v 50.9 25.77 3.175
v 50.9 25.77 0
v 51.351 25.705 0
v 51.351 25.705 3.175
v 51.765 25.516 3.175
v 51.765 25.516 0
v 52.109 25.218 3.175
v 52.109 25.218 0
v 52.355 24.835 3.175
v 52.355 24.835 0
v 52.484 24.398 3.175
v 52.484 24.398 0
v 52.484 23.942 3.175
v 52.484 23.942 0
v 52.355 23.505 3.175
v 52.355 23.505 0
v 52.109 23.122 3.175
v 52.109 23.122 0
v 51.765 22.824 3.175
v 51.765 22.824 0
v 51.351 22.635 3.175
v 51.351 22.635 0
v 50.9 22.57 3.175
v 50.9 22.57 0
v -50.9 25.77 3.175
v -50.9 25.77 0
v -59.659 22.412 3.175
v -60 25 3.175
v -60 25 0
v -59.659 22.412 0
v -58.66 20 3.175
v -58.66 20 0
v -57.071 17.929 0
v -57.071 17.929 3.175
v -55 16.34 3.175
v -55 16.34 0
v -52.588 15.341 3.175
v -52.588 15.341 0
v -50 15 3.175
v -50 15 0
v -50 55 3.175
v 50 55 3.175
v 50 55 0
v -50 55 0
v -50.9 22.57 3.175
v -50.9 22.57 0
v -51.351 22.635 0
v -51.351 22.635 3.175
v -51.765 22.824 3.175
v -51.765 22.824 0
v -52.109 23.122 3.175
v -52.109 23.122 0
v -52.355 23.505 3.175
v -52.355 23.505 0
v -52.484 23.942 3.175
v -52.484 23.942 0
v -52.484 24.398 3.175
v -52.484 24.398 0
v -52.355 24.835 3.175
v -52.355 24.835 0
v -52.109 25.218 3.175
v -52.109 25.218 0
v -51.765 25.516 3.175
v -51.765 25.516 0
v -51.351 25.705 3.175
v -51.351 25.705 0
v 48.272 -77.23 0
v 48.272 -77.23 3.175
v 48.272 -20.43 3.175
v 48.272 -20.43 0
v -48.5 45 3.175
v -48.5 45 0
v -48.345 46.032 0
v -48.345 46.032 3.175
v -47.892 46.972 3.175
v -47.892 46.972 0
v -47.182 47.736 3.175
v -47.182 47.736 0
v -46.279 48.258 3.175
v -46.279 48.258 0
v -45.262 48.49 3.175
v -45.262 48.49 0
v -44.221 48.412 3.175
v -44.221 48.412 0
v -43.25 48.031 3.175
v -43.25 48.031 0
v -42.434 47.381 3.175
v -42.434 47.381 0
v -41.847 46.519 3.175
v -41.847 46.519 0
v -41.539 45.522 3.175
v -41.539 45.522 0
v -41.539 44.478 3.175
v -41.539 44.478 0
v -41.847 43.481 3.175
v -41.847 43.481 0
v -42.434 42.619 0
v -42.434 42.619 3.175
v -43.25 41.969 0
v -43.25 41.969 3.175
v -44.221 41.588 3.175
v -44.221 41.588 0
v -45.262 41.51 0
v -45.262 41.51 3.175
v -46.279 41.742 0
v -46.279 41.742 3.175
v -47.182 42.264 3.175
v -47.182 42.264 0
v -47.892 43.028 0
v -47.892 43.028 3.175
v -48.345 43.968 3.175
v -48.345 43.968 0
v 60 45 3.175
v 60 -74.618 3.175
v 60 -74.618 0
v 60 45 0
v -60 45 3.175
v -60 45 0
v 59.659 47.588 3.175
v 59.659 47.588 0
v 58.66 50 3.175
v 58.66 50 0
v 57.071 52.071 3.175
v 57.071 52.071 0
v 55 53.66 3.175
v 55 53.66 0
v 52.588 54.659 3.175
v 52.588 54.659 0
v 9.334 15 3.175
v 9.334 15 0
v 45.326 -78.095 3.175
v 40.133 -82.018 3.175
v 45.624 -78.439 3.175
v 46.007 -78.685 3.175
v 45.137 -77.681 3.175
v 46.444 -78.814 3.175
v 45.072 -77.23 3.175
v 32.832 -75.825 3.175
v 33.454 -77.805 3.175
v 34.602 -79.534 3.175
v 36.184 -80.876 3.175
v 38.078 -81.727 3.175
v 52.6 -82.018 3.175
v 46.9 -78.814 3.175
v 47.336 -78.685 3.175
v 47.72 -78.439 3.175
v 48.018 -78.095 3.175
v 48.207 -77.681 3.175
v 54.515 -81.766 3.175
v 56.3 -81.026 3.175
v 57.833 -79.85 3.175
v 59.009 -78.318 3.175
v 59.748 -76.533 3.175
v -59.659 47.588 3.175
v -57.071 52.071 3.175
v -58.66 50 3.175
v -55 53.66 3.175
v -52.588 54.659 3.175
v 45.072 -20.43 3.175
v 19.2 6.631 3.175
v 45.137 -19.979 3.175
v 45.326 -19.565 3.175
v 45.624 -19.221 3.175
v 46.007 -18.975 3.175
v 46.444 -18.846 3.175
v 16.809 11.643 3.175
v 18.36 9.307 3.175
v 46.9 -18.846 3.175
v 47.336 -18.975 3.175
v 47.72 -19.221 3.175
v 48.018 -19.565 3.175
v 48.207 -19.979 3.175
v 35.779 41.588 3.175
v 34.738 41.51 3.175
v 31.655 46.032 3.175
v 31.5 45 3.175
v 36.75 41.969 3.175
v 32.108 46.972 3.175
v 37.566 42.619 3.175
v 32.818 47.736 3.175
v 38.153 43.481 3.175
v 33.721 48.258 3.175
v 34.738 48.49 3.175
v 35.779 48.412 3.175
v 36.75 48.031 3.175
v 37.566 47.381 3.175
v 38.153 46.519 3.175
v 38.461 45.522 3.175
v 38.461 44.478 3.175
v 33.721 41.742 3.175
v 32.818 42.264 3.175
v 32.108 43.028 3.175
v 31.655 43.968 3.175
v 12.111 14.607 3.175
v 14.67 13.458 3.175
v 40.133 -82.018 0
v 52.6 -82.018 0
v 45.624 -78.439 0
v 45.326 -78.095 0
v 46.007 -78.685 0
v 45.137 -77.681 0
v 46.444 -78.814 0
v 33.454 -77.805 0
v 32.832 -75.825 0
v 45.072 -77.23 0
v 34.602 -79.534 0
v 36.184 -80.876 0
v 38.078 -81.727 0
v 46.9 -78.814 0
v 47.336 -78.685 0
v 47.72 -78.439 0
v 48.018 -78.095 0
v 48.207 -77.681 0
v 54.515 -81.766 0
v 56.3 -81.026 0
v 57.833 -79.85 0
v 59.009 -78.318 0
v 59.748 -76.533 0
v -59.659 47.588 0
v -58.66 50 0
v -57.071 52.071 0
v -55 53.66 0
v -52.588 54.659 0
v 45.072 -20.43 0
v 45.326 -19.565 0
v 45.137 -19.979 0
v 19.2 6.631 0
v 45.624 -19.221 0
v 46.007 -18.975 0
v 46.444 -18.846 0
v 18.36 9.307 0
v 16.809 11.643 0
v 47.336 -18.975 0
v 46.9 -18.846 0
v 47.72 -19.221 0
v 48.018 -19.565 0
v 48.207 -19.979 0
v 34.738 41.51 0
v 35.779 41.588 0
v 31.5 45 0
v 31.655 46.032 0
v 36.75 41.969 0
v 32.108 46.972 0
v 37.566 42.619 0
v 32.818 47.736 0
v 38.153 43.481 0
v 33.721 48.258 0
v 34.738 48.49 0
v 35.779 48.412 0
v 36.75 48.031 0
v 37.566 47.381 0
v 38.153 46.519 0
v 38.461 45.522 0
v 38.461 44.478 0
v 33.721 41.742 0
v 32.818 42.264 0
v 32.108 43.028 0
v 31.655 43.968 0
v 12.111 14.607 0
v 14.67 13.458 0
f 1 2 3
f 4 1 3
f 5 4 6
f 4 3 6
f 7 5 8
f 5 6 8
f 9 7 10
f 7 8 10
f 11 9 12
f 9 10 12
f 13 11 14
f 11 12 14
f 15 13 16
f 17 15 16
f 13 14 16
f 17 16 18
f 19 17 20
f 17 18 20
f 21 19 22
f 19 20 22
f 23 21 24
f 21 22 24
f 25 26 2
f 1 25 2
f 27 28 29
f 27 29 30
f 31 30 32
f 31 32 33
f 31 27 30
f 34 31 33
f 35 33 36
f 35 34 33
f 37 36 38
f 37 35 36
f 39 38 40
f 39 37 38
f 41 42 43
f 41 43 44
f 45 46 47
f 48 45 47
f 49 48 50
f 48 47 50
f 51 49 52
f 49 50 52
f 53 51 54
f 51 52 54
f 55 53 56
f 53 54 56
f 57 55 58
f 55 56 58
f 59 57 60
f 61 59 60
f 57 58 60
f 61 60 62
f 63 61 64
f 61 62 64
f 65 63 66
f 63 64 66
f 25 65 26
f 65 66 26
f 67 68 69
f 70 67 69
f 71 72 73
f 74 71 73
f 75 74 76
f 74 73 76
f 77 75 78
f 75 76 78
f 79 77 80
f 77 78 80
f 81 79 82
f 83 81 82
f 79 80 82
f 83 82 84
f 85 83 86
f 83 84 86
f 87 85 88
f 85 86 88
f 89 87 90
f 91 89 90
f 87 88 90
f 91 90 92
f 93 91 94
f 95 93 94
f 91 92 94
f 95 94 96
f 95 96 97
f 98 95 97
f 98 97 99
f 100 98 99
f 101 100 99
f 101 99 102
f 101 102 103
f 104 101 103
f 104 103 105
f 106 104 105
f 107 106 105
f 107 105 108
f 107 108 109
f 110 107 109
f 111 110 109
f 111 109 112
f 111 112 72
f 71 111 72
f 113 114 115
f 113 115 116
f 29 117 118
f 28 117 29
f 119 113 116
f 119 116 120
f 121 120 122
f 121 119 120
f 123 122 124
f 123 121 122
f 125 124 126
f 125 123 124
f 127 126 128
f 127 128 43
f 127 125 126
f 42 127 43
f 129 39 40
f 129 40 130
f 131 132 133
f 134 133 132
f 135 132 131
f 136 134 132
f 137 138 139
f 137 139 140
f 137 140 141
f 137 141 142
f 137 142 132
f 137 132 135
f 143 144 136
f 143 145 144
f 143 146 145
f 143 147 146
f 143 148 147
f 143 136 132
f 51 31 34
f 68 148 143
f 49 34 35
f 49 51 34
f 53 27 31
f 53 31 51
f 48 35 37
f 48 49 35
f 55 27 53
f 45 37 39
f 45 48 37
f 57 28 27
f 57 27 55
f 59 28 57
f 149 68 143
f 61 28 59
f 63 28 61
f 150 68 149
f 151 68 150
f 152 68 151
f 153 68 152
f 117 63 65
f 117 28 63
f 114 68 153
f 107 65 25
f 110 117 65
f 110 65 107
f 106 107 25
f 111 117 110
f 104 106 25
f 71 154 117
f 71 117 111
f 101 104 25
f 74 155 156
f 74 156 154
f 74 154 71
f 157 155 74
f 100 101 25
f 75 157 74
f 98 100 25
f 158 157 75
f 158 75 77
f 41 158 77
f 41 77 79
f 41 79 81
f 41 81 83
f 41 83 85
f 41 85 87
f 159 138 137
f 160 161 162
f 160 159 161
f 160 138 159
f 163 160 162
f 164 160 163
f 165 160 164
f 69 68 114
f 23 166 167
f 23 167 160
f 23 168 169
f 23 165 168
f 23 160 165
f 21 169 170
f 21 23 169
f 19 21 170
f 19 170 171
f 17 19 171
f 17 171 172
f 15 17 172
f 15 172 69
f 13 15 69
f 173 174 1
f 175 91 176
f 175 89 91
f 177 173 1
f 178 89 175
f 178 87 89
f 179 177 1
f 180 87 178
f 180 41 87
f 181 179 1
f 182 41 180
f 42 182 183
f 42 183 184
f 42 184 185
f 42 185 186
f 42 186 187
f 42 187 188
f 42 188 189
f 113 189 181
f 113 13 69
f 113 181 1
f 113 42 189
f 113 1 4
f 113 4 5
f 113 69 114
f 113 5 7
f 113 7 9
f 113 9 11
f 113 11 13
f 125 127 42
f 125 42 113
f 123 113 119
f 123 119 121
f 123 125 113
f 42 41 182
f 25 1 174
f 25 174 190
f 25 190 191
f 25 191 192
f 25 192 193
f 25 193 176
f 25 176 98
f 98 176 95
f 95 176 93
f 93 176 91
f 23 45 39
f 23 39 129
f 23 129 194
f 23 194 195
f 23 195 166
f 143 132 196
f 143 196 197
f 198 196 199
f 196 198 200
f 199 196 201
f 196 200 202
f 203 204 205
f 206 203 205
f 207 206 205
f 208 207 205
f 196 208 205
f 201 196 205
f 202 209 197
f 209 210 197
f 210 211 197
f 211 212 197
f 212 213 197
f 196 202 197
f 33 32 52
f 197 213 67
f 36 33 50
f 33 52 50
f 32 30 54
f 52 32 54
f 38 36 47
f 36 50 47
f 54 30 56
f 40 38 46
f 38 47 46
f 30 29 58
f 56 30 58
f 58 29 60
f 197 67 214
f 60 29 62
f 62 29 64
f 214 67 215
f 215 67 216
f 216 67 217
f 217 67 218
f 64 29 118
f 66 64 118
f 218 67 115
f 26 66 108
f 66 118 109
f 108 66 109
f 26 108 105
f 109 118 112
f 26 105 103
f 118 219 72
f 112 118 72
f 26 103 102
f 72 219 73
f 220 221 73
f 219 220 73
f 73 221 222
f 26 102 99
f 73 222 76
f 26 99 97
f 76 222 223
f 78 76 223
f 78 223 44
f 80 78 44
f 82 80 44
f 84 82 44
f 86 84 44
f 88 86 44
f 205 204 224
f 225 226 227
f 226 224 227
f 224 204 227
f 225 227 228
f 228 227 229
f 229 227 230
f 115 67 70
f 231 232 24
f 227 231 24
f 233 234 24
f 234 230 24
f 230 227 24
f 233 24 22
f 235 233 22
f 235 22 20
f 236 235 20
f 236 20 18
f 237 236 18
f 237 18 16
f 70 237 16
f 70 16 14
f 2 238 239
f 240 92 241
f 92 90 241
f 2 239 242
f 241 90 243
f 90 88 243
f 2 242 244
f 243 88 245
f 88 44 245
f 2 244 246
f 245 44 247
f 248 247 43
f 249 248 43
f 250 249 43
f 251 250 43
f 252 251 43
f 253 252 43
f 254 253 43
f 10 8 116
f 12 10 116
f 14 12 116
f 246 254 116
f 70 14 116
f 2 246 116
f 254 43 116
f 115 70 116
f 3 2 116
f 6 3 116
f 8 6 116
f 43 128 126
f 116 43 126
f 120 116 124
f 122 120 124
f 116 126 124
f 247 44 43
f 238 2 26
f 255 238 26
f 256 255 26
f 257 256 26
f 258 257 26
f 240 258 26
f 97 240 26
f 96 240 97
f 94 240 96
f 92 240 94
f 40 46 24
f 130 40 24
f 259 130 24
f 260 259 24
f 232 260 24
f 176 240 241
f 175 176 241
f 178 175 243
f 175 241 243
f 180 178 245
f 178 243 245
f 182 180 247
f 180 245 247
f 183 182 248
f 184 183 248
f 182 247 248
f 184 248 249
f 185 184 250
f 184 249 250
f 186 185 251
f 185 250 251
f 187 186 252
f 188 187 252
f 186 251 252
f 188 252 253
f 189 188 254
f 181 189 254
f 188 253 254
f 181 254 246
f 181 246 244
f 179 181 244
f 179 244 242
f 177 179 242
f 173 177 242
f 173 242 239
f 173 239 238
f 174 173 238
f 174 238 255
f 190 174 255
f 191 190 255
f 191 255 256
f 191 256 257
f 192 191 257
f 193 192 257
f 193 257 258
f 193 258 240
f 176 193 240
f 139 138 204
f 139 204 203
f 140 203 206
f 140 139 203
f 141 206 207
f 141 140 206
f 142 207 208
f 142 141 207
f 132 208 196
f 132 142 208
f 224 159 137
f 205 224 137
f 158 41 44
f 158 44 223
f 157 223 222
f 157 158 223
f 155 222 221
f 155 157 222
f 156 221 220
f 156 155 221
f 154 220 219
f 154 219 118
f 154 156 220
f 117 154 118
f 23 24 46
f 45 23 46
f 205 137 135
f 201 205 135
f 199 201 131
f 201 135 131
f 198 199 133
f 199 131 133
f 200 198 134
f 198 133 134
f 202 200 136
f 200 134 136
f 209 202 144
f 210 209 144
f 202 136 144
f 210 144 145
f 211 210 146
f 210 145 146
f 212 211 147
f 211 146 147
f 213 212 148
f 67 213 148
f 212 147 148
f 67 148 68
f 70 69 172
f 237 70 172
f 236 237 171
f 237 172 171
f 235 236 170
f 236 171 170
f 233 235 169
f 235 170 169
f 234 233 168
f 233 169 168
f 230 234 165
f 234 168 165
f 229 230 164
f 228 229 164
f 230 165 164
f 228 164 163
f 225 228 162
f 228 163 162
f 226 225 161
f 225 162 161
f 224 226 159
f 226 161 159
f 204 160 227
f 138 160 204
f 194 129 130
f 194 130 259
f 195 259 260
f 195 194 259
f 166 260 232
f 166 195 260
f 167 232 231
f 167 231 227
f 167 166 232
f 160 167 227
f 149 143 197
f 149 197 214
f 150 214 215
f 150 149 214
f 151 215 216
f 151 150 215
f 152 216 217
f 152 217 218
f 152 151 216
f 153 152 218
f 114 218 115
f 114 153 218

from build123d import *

# Parameters (mm, degrees)
BASE_FLANGE1_DEPTH       = 3.175
CUT_EXTRUDE1_DEPTH       = 102.670918338
CUT_EXTRUDE2_DEPTH       = 102.670918338
F_7_0_7_DIAMETER_HOLE1_D = 7


# Sheet-metal steps are written as plain solids
with BuildPart() as part:
    # Sketch11 → Base-Flange1 (new body)
    with BuildSketch(Plane.XY.offset(3.175)):
        with BuildLine():
            Line((40.132559776, -82.017650604), (52.6, -82.017650604))
            ThreePointArc((52.6, -82.017650604), (57.832590181, -79.850240785), (60, -74.617650604))
            Line((60, -74.617650604), (60, 45))
            ThreePointArc((60, 45), (57.071067812, 52.071067812), (50, 55))
            Line((50, 55), (-50, 55))
            ThreePointArc((-50, 55), (-57.071067812, 52.071067812), (-60, 45))
            Line((-60, 45), (-60, 25))
            ThreePointArc((-60, 25), (-57.071067812, 17.928932188), (-50, 15))
            Line((-50, 15), (9.334375382, 15))
            ThreePointArc((9.334375382, 15), (15.803139956, 12.62594813), (19.200468004, 6.631016977))
            Line((19.200468004, 6.631016977), (32.831651236, -75.824603167))
            ThreePointArc((32.831651236, -75.824603167), (35.345673992, -80.260852221), (40.132559776, -82.017650604))
        make_face()
    extrude(amount=-BASE_FLANGE1_DEPTH)

    # Sketch16 → Cut-Extrude1 (cut, through all)
    with BuildSketch(Plane.XY.offset(3.175)):
        with BuildLine():
            Line((45.071829224, -20.429999447), (45.071829224, -77.229999447))
            ThreePointArc((45.071829224, -77.229999447), (46.671829224, -78.829999447), (48.271829224, -77.229999447))
            Line((48.271829224, -77.229999447), (48.271829224, -20.429999447))
            ThreePointArc((48.271829224, -20.429999447), (46.671829224, -18.829999447), (45.071829224, -20.429999447))
        make_face()
    extrude(amount=-CUT_EXTRUDE1_DEPTH, mode=Mode.SUBTRACT)

    # Sketch17 → Cut-Extrude2 (cut, through all)
    with BuildSketch(Plane(origin=(0, 0, 0), x_dir=(-1, 0, 0), z_dir=(0, 0, -1))):
        with BuildLine():
            Line((50.9, 25.770000553), (-50.9, 25.770000553))
            ThreePointArc((-50.9, 25.770000553), (-52.5, 24.170000553), (-50.9, 22.570000553))
            Line((-50.9, 22.570000553), (50.9, 22.570000553))
            ThreePointArc((50.9, 22.570000553), (52.5, 24.170000553), (50.9, 25.770000553))
        make_face()
    extrude(amount=-CUT_EXTRUDE2_DEPTH, mode=Mode.SUBTRACT)

    # Ø7.0 (7) Diameter Hole1 (through all)
    with Locations(Plane.XY.offset(3.175)):
        with Locations((35, 45), (-45, 45)):
            Hole(F_7_0_7_DIAMETER_HOLE1_D / 2)


solid = part.part
